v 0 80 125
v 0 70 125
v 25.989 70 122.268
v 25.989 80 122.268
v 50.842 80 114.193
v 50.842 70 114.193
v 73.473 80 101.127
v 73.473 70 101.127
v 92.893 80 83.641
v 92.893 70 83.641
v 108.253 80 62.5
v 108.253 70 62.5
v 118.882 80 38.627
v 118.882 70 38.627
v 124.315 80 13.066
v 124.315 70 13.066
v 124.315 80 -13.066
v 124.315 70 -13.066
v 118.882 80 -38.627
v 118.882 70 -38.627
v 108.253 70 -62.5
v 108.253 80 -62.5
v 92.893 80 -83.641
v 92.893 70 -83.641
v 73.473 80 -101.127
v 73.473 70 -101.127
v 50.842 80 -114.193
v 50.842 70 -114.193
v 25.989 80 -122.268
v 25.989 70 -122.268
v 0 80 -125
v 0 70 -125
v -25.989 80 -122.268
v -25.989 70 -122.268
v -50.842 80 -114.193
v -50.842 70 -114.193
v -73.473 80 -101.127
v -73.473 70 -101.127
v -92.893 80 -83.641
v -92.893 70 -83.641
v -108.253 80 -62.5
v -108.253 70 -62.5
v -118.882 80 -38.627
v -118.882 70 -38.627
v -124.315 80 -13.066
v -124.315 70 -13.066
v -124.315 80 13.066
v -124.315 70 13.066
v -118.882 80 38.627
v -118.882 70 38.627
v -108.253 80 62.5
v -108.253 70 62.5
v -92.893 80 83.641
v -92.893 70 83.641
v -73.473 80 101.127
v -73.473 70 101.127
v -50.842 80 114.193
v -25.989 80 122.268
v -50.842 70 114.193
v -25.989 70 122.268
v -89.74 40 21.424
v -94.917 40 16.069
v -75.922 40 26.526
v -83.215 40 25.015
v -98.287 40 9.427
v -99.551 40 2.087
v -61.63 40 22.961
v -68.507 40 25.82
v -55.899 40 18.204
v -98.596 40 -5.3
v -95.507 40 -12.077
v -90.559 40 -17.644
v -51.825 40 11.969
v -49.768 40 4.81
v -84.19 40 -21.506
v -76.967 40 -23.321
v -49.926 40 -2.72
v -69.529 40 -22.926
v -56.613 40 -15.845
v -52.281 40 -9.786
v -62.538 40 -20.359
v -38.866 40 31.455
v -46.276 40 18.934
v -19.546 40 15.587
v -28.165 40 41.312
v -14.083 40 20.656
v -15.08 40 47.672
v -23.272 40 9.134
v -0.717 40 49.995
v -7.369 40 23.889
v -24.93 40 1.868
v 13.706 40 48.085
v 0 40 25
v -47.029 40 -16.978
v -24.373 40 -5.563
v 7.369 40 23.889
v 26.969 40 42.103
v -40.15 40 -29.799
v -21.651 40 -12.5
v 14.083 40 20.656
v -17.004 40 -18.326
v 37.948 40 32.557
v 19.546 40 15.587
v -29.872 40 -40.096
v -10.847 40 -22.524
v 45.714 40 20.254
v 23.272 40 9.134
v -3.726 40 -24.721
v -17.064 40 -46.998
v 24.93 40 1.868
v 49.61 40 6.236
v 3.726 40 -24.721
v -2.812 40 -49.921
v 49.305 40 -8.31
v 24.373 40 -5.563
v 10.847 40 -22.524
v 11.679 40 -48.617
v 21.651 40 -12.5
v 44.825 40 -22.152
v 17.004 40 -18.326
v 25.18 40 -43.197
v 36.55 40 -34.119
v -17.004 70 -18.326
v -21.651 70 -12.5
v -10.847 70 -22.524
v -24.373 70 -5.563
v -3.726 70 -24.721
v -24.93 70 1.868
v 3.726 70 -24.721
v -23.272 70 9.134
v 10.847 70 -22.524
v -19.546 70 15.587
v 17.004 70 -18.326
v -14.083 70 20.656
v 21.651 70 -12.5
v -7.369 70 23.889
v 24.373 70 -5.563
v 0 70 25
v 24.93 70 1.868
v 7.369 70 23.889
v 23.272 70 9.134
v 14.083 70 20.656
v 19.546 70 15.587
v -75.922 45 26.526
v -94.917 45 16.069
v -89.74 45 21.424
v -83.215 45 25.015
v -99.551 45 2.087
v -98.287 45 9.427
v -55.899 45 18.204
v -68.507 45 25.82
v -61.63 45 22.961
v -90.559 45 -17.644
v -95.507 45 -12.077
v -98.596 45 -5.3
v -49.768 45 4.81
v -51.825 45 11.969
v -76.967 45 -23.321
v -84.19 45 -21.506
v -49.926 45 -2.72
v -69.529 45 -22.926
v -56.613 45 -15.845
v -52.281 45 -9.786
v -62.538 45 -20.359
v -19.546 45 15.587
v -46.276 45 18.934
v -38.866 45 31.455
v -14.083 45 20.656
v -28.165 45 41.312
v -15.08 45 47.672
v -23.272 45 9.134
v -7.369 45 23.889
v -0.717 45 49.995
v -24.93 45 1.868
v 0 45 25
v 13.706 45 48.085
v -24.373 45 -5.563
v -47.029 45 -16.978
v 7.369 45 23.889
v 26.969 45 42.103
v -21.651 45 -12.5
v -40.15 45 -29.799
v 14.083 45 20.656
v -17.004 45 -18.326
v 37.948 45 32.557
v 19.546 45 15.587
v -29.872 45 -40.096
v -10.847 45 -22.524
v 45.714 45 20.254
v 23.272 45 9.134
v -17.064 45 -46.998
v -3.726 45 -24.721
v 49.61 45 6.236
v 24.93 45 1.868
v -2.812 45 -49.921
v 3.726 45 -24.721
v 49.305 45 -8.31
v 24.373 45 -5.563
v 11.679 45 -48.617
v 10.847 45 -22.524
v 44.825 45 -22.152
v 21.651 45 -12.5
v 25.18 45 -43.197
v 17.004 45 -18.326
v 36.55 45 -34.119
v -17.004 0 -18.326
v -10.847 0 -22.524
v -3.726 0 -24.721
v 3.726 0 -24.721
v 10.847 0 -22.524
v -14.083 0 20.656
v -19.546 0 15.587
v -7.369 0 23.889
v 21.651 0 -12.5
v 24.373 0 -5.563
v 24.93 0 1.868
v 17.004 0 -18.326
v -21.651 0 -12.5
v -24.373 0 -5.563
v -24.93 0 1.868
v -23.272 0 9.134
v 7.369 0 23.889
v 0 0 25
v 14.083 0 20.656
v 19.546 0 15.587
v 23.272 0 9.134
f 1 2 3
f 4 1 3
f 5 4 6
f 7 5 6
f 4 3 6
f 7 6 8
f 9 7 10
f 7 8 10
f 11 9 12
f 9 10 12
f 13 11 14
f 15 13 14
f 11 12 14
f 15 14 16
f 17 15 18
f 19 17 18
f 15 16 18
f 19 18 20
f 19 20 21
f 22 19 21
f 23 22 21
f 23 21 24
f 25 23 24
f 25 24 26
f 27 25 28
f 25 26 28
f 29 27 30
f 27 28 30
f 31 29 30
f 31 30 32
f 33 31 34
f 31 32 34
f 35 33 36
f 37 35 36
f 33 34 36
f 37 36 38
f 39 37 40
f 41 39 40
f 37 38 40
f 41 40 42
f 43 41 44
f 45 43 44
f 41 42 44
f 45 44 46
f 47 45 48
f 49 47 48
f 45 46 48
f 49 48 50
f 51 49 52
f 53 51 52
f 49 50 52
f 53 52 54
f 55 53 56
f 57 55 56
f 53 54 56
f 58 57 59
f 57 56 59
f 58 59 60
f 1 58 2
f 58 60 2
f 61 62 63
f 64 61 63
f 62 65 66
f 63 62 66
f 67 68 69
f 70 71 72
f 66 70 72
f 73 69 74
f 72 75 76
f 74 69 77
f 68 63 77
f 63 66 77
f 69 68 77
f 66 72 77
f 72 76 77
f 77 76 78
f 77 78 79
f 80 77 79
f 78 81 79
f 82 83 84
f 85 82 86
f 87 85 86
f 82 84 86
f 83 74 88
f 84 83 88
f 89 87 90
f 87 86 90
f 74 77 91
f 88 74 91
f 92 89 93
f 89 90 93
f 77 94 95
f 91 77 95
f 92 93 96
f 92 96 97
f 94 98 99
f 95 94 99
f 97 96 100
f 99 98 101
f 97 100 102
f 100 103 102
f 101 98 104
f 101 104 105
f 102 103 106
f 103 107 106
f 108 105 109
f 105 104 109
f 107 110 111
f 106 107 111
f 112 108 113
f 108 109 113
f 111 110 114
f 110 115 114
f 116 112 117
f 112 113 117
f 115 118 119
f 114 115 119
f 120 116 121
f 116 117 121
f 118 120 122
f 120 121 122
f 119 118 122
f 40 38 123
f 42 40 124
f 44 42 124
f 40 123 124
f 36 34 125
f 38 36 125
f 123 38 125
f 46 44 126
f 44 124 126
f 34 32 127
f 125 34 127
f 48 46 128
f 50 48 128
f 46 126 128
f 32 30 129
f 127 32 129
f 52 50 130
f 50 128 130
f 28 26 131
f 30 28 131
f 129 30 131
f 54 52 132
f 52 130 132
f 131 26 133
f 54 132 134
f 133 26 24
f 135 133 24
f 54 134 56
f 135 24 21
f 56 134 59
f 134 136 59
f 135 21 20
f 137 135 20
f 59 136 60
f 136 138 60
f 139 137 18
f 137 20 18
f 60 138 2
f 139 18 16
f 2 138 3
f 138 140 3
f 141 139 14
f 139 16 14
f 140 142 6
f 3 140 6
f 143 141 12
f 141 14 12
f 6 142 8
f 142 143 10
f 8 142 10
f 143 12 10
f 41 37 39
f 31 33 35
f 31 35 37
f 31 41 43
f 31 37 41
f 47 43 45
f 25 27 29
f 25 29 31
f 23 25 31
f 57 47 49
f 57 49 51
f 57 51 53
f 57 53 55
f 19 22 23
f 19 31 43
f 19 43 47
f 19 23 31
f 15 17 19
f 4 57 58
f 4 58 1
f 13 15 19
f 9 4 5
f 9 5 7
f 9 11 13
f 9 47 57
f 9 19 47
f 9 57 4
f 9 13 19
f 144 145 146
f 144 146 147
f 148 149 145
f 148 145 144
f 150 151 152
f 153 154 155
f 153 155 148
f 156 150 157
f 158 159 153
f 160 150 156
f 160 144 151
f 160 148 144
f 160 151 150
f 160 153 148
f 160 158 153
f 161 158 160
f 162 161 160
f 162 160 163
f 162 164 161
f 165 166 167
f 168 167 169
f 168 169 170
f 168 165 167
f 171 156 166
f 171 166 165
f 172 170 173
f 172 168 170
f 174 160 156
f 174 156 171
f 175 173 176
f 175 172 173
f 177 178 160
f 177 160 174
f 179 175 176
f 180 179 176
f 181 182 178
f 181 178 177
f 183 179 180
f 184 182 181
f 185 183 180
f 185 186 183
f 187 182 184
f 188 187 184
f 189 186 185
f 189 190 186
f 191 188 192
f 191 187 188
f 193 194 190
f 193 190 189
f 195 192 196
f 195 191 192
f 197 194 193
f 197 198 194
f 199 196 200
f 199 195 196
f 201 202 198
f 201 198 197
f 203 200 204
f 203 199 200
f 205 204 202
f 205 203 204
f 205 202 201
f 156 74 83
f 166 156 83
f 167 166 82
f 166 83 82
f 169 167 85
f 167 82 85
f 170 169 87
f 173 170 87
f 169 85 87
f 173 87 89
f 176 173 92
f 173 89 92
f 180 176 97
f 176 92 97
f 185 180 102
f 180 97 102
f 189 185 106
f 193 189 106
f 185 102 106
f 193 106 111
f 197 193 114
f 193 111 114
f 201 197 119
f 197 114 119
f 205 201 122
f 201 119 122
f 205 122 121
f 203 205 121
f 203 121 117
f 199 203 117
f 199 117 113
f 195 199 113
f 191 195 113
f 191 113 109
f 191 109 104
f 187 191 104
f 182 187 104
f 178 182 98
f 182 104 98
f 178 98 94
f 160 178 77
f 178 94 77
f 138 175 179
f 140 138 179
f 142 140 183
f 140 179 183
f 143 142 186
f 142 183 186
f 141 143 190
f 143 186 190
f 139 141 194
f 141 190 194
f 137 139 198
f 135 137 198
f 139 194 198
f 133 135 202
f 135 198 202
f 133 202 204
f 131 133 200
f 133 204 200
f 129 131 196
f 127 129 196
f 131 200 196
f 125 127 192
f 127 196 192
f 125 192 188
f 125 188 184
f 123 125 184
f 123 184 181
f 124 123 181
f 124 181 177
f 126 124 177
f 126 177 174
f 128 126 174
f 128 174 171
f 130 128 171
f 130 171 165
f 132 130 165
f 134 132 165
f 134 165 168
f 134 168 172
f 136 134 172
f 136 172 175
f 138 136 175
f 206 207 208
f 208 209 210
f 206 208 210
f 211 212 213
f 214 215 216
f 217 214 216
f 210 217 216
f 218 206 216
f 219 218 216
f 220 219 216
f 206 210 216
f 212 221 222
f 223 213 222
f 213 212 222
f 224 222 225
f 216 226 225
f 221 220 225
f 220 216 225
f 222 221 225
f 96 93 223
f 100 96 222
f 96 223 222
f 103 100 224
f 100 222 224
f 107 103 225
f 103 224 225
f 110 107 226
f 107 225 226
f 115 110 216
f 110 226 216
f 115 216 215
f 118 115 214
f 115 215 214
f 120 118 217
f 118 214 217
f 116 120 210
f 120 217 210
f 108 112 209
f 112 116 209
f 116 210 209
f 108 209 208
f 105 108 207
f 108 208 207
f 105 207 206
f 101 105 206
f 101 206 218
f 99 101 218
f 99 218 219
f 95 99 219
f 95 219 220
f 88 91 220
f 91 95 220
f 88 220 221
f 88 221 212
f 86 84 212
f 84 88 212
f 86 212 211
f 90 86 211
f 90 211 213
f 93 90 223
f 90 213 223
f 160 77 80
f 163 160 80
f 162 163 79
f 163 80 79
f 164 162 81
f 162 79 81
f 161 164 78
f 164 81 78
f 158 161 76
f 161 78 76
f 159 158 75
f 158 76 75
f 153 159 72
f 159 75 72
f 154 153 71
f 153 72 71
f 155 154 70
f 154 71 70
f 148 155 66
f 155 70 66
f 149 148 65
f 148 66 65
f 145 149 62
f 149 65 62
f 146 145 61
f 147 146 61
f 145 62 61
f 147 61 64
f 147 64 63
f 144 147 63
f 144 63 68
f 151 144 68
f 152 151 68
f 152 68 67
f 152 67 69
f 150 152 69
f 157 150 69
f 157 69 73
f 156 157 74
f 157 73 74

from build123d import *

# Parameters (mm, degrees)
SKETCH1_R           = 25
BOSS_EXTRUDE1_DEPTH = 70
BOSS_EXTRUDE2_DEPTH = 5
SKETCH3_R           = 125
BOSS_EXTRUDE3_DEPTH = 10


with BuildPart() as part:
    # Sketch1 → Boss-Extrude1 (new body)
    with BuildSketch(Plane(origin=(0, 0, 0), x_dir=(1, 0, 0), z_dir=(0, 1, 0))):
        with Locations(Location((0, 0, 0), (0, 0, 270))):
            Circle(SKETCH1_R)
    extrude(amount=BOSS_EXTRUDE1_DEPTH)

    # Sketch2 → Boss-Extrude2 (add)
    with BuildSketch(Plane(origin=(0, 40, 0), x_dir=(1, 0, 0), z_dir=(0, 1, 0))):
        with BuildLine():
            ThreePointArc((-49.768073149, -4.810290534), (49.989018115, 1.047887371), (-49.925935592, 2.720469675))
            ThreePointArc((-49.925935592, 2.720469675), (-99.550770715, -2.086818253), (-49.768073149, -4.810290534))
        make_face()
    extrude(amount=BOSS_EXTRUDE2_DEPTH)

    # Sketch3 → Boss-Extrude3 (add)
    with BuildSketch(Plane(origin=(0, 70, 0), x_dir=(1, 0, 0), z_dir=(0, 1, 0))):
        with Locations(Location((0, 0, 0), (0, 0, 270))):
            Circle(SKETCH3_R)
    extrude(amount=BOSS_EXTRUDE3_DEPTH)


solid = part.part
